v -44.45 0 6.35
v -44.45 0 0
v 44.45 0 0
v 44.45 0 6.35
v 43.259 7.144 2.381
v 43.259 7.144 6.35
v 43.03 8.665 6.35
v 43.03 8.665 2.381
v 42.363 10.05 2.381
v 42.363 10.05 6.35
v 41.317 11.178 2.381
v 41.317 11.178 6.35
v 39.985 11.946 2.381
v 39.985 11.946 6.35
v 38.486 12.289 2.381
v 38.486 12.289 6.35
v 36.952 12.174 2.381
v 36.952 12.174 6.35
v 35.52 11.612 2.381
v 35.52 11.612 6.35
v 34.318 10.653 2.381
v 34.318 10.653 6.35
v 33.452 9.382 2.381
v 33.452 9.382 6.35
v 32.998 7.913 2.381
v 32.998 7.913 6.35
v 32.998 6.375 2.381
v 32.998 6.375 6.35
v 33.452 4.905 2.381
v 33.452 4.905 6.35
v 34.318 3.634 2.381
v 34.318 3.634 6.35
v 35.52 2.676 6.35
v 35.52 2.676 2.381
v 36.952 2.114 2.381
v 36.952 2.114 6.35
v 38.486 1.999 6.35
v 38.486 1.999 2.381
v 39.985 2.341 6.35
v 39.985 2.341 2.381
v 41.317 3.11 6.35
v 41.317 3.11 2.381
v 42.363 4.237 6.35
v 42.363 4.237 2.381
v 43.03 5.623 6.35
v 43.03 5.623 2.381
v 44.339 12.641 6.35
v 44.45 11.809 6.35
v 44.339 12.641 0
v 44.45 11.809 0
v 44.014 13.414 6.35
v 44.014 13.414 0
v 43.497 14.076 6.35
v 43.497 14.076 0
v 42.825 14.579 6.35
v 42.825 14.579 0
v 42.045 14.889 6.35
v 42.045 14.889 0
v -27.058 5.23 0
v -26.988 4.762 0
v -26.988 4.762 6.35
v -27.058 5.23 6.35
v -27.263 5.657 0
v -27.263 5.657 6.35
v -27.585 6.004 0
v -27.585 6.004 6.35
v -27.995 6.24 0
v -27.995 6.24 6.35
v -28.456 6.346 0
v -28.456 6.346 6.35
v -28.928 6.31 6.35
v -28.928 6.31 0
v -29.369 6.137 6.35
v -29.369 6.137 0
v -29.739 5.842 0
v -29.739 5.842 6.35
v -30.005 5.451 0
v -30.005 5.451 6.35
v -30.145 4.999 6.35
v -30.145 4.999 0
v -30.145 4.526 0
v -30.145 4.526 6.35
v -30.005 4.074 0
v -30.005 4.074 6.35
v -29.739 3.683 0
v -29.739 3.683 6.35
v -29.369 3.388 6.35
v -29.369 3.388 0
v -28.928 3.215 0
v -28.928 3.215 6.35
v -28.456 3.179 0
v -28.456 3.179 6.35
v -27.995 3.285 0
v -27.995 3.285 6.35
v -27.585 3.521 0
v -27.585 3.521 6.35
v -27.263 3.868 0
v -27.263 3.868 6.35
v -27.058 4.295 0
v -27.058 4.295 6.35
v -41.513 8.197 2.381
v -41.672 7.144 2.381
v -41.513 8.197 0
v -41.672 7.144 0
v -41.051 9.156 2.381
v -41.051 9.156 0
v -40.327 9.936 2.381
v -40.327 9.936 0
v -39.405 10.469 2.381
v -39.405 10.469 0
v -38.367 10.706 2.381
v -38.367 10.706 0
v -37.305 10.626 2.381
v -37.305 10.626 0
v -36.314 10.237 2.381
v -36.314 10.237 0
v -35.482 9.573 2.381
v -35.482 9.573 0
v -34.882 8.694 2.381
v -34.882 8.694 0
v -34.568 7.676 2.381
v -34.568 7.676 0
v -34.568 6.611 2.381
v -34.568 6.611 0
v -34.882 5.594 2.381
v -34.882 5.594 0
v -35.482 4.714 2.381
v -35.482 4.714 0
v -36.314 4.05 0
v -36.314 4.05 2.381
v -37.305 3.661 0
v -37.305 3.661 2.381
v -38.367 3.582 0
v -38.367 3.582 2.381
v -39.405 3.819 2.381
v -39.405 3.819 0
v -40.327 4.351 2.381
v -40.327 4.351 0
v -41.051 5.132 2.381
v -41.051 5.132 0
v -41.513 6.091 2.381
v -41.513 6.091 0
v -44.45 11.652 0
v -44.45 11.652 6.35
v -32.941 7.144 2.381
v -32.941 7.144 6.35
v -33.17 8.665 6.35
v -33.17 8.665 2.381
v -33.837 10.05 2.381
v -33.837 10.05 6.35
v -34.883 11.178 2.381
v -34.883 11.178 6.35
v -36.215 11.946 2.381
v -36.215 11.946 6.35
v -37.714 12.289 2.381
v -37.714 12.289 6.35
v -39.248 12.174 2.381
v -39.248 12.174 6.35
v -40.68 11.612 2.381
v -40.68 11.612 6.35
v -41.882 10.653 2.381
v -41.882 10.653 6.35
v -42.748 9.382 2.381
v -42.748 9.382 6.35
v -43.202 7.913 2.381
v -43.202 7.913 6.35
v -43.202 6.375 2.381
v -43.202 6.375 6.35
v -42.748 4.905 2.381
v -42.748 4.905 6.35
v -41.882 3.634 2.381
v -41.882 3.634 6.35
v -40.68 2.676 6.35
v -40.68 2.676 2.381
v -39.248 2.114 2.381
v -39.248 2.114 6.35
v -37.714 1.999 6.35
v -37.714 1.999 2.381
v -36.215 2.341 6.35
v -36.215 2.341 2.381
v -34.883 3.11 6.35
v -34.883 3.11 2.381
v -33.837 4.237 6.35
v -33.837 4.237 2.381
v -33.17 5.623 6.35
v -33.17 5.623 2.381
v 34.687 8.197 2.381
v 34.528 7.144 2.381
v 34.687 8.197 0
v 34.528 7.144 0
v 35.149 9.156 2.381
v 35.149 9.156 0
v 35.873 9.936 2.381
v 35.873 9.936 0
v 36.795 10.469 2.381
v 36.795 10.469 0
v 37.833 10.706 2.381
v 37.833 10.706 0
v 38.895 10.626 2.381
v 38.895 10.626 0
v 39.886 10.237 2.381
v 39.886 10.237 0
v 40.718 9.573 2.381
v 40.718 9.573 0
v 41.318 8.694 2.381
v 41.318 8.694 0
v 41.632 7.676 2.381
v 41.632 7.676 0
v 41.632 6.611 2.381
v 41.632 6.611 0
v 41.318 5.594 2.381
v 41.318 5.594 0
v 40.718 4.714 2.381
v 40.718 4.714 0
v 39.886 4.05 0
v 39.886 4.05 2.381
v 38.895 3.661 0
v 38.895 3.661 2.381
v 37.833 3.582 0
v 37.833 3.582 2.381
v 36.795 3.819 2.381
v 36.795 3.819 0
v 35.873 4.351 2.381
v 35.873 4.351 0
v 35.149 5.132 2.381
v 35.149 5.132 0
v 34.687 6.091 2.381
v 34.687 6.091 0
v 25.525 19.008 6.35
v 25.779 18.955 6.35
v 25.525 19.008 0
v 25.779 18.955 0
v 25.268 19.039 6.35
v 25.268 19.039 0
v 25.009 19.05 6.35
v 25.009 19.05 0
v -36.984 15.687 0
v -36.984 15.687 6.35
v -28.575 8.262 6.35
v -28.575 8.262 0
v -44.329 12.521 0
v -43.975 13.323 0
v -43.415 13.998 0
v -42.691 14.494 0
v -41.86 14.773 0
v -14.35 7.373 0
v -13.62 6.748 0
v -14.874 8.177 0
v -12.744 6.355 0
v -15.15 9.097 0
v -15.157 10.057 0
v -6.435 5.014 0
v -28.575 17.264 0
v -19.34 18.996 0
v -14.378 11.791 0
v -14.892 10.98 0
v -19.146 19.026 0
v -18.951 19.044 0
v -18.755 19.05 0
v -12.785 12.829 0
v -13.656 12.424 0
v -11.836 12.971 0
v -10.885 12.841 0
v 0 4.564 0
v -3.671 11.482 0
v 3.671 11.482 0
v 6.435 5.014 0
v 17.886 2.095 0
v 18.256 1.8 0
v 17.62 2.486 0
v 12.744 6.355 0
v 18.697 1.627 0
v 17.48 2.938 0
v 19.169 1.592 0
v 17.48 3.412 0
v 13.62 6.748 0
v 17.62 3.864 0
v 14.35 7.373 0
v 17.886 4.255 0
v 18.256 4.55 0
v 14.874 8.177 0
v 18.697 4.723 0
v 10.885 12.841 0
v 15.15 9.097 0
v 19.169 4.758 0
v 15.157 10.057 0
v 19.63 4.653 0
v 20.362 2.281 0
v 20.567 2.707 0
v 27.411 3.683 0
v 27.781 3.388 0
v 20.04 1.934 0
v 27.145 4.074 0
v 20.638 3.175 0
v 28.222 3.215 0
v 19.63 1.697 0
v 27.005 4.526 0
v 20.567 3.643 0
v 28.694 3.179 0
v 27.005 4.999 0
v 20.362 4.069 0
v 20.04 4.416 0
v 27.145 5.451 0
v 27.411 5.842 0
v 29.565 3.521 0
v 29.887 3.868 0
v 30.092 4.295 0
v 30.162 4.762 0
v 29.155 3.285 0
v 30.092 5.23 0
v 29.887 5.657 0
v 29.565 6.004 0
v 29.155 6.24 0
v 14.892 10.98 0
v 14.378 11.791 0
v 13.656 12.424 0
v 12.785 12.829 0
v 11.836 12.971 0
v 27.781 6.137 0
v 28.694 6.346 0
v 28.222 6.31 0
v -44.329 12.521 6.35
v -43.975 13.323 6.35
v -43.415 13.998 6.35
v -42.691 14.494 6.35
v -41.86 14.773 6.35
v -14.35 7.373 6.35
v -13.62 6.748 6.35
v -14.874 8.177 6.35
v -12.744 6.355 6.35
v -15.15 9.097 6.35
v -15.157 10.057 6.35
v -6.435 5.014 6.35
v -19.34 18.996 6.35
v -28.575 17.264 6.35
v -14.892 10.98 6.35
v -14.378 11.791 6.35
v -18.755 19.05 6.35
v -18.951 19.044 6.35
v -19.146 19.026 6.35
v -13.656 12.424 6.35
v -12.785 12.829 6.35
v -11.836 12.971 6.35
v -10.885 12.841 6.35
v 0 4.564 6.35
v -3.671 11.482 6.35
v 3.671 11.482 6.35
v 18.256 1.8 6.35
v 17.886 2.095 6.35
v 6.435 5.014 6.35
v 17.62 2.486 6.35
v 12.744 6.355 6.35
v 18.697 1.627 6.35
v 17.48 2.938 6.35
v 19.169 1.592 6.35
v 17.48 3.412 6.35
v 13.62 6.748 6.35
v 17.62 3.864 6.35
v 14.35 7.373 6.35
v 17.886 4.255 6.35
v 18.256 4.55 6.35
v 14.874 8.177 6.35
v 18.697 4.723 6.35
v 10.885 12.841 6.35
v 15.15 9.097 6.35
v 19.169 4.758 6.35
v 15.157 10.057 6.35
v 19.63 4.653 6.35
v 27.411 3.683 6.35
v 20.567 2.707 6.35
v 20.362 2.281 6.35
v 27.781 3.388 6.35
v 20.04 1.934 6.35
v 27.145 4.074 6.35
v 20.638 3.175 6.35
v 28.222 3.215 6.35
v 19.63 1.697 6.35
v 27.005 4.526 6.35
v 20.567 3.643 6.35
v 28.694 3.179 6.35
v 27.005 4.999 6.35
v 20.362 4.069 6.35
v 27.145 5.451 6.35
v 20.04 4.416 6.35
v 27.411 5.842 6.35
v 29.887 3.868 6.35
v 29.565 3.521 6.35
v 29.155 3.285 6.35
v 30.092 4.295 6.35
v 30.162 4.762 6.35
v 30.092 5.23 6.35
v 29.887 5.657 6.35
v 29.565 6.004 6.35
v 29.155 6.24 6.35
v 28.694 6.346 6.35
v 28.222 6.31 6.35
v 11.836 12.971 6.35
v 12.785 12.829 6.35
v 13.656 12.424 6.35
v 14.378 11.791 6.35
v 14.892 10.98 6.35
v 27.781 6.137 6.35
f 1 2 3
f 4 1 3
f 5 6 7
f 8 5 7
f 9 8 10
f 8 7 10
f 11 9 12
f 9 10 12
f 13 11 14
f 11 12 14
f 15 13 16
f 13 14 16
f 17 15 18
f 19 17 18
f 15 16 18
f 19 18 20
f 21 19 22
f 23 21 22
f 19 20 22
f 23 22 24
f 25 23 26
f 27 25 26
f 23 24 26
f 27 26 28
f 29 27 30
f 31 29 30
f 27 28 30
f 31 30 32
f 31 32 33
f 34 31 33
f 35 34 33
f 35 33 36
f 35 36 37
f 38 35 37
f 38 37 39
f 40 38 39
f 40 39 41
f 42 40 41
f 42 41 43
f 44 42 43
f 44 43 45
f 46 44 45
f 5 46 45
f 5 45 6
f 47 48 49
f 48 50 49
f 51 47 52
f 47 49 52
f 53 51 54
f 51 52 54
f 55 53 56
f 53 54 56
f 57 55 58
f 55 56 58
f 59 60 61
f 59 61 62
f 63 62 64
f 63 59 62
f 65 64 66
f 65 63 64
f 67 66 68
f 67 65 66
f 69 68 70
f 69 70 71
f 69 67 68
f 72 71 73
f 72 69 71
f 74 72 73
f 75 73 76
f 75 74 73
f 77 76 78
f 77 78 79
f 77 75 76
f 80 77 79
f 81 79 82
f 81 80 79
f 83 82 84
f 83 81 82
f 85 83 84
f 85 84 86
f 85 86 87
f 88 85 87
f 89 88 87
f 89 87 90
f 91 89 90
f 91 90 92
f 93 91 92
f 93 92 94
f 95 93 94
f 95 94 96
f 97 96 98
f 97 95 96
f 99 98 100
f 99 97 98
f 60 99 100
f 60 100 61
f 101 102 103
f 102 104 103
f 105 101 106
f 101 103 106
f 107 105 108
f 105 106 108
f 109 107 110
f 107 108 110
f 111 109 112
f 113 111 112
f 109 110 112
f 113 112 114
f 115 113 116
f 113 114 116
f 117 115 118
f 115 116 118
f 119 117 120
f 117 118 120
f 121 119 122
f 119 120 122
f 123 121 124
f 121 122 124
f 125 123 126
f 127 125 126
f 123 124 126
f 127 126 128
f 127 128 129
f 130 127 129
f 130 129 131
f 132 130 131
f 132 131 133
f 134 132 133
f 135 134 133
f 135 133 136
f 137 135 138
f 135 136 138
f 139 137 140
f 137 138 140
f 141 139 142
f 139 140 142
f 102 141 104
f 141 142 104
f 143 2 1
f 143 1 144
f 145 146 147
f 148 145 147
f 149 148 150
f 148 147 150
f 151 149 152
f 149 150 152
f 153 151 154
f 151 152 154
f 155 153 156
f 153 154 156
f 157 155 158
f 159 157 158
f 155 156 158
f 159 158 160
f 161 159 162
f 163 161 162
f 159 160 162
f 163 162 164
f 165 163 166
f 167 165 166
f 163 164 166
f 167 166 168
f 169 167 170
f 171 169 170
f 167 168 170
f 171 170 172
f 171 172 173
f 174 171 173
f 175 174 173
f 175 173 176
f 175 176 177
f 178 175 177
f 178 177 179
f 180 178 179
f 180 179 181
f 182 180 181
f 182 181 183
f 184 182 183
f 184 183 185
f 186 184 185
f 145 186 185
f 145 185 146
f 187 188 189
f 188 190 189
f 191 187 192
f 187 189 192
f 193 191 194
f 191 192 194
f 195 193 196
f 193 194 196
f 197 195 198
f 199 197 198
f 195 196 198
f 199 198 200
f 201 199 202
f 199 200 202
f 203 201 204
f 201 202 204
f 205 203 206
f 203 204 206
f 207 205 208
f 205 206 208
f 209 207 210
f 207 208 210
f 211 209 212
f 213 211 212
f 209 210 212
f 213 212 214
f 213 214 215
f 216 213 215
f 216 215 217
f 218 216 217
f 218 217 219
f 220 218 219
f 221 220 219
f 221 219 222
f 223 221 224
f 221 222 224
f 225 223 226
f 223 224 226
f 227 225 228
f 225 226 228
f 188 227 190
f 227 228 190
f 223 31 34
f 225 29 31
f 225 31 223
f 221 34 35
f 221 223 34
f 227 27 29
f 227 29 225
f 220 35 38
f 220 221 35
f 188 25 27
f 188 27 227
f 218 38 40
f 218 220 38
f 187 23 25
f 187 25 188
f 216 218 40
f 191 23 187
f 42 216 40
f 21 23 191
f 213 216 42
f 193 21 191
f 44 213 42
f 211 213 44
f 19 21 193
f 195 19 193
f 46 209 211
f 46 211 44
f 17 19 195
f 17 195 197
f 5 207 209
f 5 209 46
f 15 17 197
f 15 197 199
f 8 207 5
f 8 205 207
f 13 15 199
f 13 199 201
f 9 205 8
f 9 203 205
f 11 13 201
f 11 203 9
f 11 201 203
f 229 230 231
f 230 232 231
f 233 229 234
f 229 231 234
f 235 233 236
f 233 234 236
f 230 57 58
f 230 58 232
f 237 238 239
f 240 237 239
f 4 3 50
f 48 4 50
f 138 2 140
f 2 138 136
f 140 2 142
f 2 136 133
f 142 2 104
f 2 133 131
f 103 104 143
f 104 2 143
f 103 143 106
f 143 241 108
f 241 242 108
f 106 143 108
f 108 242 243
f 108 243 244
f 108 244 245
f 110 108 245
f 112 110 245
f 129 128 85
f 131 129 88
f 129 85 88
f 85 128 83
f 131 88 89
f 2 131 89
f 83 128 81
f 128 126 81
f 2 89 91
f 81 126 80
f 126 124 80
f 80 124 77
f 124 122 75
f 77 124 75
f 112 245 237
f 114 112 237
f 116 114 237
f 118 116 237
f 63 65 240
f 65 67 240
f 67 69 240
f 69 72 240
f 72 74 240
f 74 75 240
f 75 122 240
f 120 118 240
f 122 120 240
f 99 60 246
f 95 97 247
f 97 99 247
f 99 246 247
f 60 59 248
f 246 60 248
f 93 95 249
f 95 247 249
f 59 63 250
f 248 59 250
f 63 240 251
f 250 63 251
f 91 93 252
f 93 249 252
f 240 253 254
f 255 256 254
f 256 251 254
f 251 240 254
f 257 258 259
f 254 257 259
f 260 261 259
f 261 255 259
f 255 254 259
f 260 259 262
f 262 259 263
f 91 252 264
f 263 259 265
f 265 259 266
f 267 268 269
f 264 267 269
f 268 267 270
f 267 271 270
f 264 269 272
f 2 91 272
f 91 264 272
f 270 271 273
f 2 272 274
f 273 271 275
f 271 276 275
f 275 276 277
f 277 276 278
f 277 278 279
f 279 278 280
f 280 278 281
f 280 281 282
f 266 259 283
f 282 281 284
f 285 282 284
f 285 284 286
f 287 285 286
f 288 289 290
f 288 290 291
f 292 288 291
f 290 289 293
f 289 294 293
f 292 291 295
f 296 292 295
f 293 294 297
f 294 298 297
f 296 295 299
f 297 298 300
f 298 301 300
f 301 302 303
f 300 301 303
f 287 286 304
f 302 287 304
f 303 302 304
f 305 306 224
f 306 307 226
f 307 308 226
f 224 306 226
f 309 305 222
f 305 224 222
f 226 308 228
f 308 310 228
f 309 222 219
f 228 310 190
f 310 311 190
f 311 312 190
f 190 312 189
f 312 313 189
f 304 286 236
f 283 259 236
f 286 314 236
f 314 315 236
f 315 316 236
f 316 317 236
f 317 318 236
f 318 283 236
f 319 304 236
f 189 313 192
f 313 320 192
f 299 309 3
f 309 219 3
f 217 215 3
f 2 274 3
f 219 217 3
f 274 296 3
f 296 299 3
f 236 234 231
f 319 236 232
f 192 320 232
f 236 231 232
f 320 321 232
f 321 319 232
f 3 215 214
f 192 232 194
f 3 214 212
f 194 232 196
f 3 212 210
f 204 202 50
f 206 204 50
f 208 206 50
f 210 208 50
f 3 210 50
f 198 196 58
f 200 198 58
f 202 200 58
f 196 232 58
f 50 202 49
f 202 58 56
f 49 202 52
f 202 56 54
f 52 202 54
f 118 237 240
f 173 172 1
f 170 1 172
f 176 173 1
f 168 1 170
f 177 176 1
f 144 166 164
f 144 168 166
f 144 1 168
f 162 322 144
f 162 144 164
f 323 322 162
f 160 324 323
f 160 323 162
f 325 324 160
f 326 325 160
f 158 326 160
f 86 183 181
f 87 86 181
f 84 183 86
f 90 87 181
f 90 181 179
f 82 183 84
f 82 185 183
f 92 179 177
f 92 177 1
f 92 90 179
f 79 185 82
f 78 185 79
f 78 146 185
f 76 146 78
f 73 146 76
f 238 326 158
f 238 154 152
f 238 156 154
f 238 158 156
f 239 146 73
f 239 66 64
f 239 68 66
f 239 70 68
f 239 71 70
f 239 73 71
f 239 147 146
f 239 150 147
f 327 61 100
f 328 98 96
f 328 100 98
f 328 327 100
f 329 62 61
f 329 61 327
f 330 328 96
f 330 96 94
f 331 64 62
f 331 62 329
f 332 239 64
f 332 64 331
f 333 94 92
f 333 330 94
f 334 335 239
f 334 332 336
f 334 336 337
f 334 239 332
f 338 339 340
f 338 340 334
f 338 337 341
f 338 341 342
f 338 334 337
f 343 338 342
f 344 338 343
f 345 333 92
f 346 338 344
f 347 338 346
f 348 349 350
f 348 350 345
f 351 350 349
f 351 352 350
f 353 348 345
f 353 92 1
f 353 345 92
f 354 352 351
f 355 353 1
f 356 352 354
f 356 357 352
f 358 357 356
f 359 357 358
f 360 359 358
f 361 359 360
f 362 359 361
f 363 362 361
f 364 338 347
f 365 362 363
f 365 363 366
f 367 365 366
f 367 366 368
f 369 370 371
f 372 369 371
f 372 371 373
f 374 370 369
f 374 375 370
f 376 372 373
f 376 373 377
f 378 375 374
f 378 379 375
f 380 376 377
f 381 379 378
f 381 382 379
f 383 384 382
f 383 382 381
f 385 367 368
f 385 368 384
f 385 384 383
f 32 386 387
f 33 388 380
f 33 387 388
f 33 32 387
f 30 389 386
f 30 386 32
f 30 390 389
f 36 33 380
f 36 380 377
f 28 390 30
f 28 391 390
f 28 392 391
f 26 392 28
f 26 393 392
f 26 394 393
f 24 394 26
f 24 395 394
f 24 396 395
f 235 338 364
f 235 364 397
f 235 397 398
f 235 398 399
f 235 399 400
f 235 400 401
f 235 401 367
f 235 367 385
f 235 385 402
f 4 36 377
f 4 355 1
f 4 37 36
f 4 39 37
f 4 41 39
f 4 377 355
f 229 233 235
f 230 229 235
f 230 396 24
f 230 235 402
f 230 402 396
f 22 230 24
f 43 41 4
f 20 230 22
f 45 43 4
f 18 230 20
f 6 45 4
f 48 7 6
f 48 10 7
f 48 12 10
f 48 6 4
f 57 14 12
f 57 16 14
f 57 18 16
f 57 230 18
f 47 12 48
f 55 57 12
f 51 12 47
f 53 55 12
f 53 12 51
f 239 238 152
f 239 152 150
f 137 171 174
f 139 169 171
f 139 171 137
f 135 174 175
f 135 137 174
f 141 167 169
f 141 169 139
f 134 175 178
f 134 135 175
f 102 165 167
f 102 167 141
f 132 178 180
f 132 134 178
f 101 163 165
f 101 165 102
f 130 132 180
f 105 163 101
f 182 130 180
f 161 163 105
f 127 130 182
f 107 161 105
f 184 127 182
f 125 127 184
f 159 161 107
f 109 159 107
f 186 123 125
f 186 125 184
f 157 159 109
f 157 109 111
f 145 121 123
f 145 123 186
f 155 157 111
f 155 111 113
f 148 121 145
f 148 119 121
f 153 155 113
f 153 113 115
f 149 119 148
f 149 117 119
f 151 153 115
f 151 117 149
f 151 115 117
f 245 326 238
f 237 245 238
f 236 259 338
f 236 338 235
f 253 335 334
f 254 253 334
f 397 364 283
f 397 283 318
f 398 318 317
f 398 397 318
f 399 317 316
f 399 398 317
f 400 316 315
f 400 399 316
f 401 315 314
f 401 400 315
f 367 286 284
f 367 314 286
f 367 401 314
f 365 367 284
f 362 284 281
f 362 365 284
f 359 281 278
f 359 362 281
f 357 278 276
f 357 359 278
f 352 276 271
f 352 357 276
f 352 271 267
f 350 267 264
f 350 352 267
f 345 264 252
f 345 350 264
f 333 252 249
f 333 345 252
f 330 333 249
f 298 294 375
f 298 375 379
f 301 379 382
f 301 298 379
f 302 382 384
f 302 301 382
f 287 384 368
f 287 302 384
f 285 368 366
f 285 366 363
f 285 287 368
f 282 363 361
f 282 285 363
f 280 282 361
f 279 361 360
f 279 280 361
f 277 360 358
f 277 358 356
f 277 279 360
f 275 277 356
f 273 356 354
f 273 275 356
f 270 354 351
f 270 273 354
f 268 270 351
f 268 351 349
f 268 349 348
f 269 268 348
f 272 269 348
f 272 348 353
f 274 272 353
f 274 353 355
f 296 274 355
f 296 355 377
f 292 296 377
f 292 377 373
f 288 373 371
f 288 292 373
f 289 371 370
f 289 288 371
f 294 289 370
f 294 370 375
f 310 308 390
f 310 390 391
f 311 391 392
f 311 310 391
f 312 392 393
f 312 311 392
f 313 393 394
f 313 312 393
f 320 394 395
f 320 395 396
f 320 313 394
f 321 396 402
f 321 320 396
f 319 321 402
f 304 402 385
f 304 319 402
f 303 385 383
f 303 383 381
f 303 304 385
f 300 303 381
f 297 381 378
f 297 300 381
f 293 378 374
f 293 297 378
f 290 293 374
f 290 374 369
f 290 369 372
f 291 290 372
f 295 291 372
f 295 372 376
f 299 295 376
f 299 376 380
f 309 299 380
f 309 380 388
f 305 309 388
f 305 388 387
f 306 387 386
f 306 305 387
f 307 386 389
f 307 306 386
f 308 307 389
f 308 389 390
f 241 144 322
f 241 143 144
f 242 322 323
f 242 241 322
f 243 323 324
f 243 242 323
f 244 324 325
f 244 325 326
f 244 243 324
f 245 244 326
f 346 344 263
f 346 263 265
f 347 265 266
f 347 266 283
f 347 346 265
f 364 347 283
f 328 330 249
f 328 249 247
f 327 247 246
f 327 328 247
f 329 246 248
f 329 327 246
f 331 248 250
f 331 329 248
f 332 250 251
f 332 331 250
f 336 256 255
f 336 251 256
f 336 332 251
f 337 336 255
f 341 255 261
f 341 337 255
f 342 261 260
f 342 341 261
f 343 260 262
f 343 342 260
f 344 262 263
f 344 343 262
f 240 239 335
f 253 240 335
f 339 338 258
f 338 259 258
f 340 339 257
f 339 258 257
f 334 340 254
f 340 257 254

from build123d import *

# Parameters (mm, degrees)
SKETCH1_W          = 88.9
SKETCH1_H          = 19.05
BASE_EXTRUDE_DEPTH = 6.35
CUT_EXTRUDE1_DEPTH = 49.775275499
CUT_EXTRUDE3_DEPTH = 49.775275499
CUT_EXTRUDE4_DEPTH = 49.775275499
CUT_EXTRUDE5_DEPTH = 49.775275499
FILLET1_R          = 3.175
HOLE1_D            = 7.14375
HOLE1_CBORE_D      = 10.31875
HOLE1_CBORE_DEPTH  = 3.96875
LPATTERN1_COUNT    = 2
LPATTERN1_PITCH    = 76.2
HOLE2_OUTLINE_R    = 1.5875
HOLE2_DEPTH        = 6.35
HOLE3_OUTLINE_R    = 1.5875
HOLE3_DEPTH        = 6.35
LPATTERN2_COUNT    = 2
LPATTERN2_PITCH    = 57.15


# Read off the part's stored shape, not the designer's step: Hole2, Hole3
with BuildPart() as part:
    # Sketch1 → Base-Extrude (new body)
    with BuildSketch(Plane.XY):
        with Locations((0, 9.525)):
            Rectangle(SKETCH1_W, SKETCH1_H)
    extrude(amount=BASE_EXTRUDE_DEPTH)

    # Sketch2 → Cut-Extrude1 (cut, through all)
    with BuildSketch(Plane.XY.offset(6.35)):
        Polygon((44.45, 14.2875), (25.4, 19.05), (44.45, 19.05), align=None)
    extrude(amount=-CUT_EXTRUDE1_DEPTH, mode=Mode.SUBTRACT)

    # Sketch4 → Cut-Extrude3 (cut, through all)
    with BuildSketch(Plane.XY.offset(6.35)):
        Polygon((-231.275885049, -20.742353447), (-44.45, 14.2875), (-19.05, 19.05), (167.775885049, 54.079853447), (97.716178156, 427.731623544), (-301.335591942, 352.909416651), align=None)
    extrude(amount=-CUT_EXTRUDE3_DEPTH, mode=Mode.SUBTRACT)

    # Sketch5 → Cut-Extrude4 (cut, through all)
    with BuildSketch(Plane.XY.offset(6.35)):
        Polygon((-36.984386732, 15.687302488), (-28.575, 8.262261056), (-28.575, 17.2640625), align=None)
    extrude(amount=-CUT_EXTRUDE4_DEPTH, mode=Mode.SUBTRACT)

    # Sketch6 → Cut-Extrude5 (cut, through all)
    with BuildSketch(Plane.XY.offset(6.35)):
        with BuildLine():
            ThreePointArc((-10.884660771, 12.84067681), (0, 11.3109375), (10.884660771, 12.84067681))
            ThreePointArc((10.884660771, 12.84067681), (15.057262416, 10.52776595), (12.744351556, 6.355164305))
            ThreePointArc((12.744351556, 6.355164305), (0, 4.5640625), (-12.744351556, 6.355164305))
            ThreePointArc((-12.744351556, 6.355164305), (-15.057262416, 10.52776595), (-10.884660771, 12.84067681))
        make_face()
    extrude(amount=-CUT_EXTRUDE5_DEPTH, mode=Mode.SUBTRACT)

    # Fillet1
    fillet1_edges = [part.edges().sort_by_distance(p)[0] for p in [
        (44.45, 14.2875, 3.175),
        (25.4, 19.05, 3.175),
        (-19.05, 19.05, 3.175),
        (-44.45, 14.2875, 3.175),
    ]]
    fillet(fillet1_edges, radius=FILLET1_R)

    # Hole1 (through all)
    with Locations(Plane.XY.offset(6.35)):
        with Locations((38.1, 7.14375)):
            hole1 = CounterBoreHole(HOLE1_D / 2, HOLE1_CBORE_D / 2, HOLE1_CBORE_DEPTH)

    # LPattern1: Hole1 ×2
    with Locations(*[(-i * LPATTERN1_PITCH, 0, 0) for i in range(1, LPATTERN1_COUNT)]):
        add(hole1, mode=Mode.SUBTRACT)

    # Hole2 outline → Hole2 (cut)
    with BuildSketch(Plane.XY):
        with Locations((28.575, 4.7625)):
            Circle(HOLE2_OUTLINE_R)
    hole2 = extrude(amount=HOLE2_DEPTH, mode=Mode.SUBTRACT)

    # Hole3 outline → Hole3 (cut)
    with BuildSketch(Plane.XY):
        with Locations((19.05, 3.175)):
            Circle(HOLE3_OUTLINE_R)
    extrude(amount=HOLE3_DEPTH, mode=Mode.SUBTRACT)

    # LPattern2: Hole2 ×2
    with Locations(*[(-i * LPATTERN2_PITCH, 0, 0) for i in range(1, LPATTERN2_COUNT)]):
        add(hole2, mode=Mode.SUBTRACT)


solid = part.part
